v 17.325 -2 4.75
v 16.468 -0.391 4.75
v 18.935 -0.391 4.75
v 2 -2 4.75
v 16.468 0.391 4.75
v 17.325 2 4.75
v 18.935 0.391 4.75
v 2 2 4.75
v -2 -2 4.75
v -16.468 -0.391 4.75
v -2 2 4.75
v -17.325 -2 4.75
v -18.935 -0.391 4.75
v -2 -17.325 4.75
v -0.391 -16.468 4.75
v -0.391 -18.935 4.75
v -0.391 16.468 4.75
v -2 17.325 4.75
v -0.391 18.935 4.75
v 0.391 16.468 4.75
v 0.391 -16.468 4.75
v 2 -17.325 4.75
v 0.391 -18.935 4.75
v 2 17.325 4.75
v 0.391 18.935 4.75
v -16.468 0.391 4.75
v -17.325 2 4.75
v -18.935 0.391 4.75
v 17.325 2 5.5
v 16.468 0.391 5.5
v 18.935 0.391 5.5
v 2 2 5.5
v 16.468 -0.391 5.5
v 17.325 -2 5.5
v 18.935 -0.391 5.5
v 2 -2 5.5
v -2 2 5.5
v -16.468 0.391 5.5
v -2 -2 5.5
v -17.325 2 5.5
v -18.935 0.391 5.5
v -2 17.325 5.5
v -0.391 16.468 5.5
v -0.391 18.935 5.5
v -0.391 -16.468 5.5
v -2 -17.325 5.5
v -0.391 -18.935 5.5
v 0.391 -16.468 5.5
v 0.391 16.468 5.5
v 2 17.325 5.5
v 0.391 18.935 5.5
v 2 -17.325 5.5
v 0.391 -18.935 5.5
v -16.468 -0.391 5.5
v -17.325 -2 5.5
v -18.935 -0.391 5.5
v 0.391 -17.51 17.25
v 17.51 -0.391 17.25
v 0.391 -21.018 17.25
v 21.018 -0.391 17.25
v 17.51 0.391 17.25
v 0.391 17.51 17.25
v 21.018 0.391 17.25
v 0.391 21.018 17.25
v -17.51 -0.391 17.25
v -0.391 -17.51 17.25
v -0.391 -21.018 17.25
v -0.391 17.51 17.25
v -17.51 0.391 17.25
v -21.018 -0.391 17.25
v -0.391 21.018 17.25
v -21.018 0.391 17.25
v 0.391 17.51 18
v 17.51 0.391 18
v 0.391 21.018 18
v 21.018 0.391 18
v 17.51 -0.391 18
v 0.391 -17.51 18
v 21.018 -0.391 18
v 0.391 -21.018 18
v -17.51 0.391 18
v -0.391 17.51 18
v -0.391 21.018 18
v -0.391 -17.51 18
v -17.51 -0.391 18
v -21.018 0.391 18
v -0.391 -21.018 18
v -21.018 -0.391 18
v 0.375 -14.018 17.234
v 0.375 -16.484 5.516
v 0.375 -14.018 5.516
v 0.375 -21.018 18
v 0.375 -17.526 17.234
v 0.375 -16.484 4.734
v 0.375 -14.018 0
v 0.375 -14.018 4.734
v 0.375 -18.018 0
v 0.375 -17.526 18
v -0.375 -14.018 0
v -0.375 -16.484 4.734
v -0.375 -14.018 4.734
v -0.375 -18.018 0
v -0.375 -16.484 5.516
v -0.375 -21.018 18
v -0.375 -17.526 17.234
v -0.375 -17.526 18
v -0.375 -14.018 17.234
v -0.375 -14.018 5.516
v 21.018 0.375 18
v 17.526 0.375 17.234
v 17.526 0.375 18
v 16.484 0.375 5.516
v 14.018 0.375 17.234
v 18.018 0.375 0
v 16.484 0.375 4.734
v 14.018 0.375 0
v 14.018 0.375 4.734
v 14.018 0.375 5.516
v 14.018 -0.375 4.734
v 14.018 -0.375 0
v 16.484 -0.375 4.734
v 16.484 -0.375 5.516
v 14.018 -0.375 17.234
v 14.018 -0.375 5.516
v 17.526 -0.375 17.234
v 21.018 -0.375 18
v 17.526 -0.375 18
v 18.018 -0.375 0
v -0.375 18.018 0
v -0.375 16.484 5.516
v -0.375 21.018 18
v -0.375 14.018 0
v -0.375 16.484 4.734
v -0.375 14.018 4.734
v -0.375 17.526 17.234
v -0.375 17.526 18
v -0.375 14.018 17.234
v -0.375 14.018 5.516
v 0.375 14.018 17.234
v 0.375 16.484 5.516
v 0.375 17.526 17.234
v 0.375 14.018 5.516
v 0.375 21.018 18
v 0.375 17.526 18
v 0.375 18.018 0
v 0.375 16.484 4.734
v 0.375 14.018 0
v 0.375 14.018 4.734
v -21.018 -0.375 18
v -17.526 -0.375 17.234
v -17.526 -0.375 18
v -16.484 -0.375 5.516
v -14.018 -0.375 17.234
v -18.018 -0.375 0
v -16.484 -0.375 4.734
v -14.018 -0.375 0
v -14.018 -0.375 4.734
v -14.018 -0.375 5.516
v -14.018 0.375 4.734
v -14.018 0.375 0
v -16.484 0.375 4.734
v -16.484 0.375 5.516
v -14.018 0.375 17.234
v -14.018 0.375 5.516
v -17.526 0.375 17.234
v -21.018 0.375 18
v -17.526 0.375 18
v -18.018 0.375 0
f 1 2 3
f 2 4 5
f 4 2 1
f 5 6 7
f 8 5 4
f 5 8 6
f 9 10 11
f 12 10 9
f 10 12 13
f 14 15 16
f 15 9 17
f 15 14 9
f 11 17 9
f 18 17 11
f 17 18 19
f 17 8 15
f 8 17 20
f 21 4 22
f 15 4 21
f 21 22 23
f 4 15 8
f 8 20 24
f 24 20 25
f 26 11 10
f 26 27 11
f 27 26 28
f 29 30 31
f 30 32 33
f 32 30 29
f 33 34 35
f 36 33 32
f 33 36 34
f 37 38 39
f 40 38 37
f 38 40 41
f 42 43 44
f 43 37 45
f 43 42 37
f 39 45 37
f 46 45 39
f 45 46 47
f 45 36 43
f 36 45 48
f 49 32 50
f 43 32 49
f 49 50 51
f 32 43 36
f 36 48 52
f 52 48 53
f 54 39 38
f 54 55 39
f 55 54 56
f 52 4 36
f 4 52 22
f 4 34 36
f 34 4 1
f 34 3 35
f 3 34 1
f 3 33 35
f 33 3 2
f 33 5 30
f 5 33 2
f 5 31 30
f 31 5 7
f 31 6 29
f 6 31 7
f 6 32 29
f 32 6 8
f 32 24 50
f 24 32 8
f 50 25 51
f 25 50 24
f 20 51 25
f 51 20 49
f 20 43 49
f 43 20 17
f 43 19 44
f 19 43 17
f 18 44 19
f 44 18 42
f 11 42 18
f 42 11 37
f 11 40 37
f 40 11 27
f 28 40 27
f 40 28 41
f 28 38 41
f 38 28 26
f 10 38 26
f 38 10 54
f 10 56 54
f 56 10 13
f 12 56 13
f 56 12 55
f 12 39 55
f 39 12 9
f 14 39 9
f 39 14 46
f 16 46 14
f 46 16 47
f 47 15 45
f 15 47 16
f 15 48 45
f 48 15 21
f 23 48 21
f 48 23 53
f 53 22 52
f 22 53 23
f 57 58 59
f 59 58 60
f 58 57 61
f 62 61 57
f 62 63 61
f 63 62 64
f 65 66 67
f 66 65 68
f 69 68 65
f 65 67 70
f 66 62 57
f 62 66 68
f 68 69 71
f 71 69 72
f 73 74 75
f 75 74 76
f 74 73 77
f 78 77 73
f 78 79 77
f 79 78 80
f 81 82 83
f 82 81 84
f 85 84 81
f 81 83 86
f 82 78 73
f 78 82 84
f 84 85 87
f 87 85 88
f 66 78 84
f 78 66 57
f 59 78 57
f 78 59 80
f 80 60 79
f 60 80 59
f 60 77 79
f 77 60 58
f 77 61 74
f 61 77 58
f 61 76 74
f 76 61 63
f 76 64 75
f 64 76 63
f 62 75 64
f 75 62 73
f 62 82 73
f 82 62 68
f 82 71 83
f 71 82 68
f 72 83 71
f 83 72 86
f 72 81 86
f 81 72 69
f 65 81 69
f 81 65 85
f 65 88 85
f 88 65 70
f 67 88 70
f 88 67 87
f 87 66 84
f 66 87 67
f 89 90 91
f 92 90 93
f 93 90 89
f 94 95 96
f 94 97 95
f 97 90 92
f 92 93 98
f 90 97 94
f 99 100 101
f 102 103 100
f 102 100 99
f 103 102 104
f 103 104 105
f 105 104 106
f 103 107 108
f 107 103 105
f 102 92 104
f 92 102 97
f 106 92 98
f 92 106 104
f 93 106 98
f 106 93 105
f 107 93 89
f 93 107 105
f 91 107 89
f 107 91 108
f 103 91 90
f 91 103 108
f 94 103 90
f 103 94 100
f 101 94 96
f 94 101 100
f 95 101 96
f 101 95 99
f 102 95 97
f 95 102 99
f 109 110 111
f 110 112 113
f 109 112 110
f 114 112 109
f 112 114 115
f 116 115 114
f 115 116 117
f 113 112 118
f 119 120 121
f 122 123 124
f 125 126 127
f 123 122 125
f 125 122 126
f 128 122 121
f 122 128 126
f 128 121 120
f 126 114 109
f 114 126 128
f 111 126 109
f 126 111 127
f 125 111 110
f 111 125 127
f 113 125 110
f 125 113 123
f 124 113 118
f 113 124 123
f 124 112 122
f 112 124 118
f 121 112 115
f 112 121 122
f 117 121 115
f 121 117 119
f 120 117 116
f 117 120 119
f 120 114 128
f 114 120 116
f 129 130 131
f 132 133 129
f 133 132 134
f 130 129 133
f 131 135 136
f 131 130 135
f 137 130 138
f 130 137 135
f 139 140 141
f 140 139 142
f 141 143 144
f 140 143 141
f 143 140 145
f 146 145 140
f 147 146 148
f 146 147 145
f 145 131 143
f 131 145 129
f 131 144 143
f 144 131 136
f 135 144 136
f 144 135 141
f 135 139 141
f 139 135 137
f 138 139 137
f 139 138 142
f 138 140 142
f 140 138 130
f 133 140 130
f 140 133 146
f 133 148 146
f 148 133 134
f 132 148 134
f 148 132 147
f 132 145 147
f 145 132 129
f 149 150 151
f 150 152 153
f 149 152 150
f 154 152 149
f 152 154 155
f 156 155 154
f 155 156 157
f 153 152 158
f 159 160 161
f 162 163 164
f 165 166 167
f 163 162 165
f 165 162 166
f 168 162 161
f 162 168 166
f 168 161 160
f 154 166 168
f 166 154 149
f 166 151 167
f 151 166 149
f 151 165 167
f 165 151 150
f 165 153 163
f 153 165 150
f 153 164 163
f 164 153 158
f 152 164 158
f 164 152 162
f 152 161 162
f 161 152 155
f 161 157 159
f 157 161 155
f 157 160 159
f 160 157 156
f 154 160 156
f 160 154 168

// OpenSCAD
// file: ../src/functions.scad
module shelf(type, diameter,leg_width) {
    if (type == 0)
    round_shelf(diameter, leg_width);
    if (type == 1)
    square_shelf(diameter, leg_width);
    if (type == 2)
    square_shelf_leg_supports(diameter, leg_width);
}

module round_shelf(diameter,leg_width) {
    difference() {
        circle(d=diameter);
        leg_slots(diameter, leg_width);
    }
}

module square_shelf(diameter,leg_width) {
    difference() {
        hull() {
            leg_slots(diameter, leg_width);
        }
        leg_slots(diameter, leg_width);
    }
}

module square_shelf_leg_supports(diameter,leg_width) {
    intersection() {
        square_shelf(diameter, leg_width);
        for(i=[0:leg_count-1]) {
            rotate(i*360/leg_count)
            translate([-leg_support/2,-diameter/2])
            square([leg_support,diameter/2]);
        }
    }
}


module leg_slots(diameter, leg_width) {
    for(i=[0:leg_count-1]) {
        rotate(i*360/leg_count)
        translate([-leg_thick/2-gap,-diameter/2])
        square([leg_thick+gapp,leg_width]);
    }
}

module shelf_number(i) {
        shelf(shelves[i], tan(leg_angle)*((top_height-leg_height)/(shelf_count-1)*i+leg_height)*2+bottom,(tan(leg_angle)*((top_height-leg_height)/(shelf_count-1)*i+leg_height)+min_leg)/2+gap/2);
}

module assemble_shelves() {
    for(i=[0:shelf_count-1]) {
        translate([0,0,(top_height-leg_height)/(shelf_count-1)*i+leg_height-plywood])
        linear_extrude(height=plywood)
        shelf_number(i);
    }
}

module assemble_legs() {
    for(i=[0:leg_count-1]) {
        rotate(i*360/leg_count)
        translate([-leg_thick/2-plywood/2,0,0])
        for(l=[1:leg_layers]) {
            translate([plywood*l,0,0])
            leg_3d();
        }
    }
}

//shelf(bottom,min_leg);

module leg() {
    difference() {
        square([min_leg+(top-bottom)/2,top_height]);
        translate([min_leg,0])
        rotate(-leg_angle)
        square([min_leg+(top-bottom),top_height*2]);
        for(i=[0:shelf_count-1]) {
            translate([0,(top_height-leg_height)/(shelf_count-1)*i+leg_height-plywood-gap])
            square([(tan(leg_angle)*((top_height-leg_height)/(shelf_count-1)*i+leg_height)+min_leg)/2+gap/2,plywood+gapp]);
        }
            
    }
}

module leg_3d() {
    translate([0,-bottom/2+min_leg,0])
    rotate([90,0,-90])
    translate([0,0,-plywood/2])
    color("lime")
    linear_extrude(height=plywood)
    leg();
}

module assemble() {
    assemble_shelves();
    assemble_legs();
}

module plate() {
    for(i=[0:leg_count/2-1]) {
        translate([i*((top-bottom)/2+min_leg*2+tree*2),0]) {
            leg();
            translate([min_leg+(top-bottom)/2+tree+min_leg,top_height])
            rotate(180)
            leg();
        }
    }
    if(leg_count%2 != 0) {
            translate([floor(leg_count/2)*((top-bottom)/2+min_leg*2+tree*2),0])
            leg();
    }
    translate([0,-top/2-tree])
    for(i=[0:shelf_count-1]) {
        //too much math, I can drag in inkscape
        translate([top*i,0])
        shelf_number(i);
    }
}
// main file
include <../src/functions.scad>;

square_top=30;
shelves = [2, 1];
// 0 = round
// 1 = square
// 2 = leg_supports (square)
shelf_count = len(shelves);
leg_layers=1;
leg_count = 4;
leg_height = 5.5;
top_height = 18;
min_leg = 4 + sin($t*360)*3; //smallest size a leg can be
plywood = 0.75;
gap = 1/64;
gapp = gap*2;
pad = 0.1;
padd = pad*2;
leg_thick=plywood*leg_layers;

leg_support=4;

tree=2;

top = sqrt(2*pow((square_top/2),2))*2-leg_thick/2-gap; //diameter
bottom = top-6; //diameter
leg_angle = atan((top-bottom)/2/top_height);
echo("top is", top);

$fn=120;


// RENDER gif
module demo() {
    assemble();
}

demo();
